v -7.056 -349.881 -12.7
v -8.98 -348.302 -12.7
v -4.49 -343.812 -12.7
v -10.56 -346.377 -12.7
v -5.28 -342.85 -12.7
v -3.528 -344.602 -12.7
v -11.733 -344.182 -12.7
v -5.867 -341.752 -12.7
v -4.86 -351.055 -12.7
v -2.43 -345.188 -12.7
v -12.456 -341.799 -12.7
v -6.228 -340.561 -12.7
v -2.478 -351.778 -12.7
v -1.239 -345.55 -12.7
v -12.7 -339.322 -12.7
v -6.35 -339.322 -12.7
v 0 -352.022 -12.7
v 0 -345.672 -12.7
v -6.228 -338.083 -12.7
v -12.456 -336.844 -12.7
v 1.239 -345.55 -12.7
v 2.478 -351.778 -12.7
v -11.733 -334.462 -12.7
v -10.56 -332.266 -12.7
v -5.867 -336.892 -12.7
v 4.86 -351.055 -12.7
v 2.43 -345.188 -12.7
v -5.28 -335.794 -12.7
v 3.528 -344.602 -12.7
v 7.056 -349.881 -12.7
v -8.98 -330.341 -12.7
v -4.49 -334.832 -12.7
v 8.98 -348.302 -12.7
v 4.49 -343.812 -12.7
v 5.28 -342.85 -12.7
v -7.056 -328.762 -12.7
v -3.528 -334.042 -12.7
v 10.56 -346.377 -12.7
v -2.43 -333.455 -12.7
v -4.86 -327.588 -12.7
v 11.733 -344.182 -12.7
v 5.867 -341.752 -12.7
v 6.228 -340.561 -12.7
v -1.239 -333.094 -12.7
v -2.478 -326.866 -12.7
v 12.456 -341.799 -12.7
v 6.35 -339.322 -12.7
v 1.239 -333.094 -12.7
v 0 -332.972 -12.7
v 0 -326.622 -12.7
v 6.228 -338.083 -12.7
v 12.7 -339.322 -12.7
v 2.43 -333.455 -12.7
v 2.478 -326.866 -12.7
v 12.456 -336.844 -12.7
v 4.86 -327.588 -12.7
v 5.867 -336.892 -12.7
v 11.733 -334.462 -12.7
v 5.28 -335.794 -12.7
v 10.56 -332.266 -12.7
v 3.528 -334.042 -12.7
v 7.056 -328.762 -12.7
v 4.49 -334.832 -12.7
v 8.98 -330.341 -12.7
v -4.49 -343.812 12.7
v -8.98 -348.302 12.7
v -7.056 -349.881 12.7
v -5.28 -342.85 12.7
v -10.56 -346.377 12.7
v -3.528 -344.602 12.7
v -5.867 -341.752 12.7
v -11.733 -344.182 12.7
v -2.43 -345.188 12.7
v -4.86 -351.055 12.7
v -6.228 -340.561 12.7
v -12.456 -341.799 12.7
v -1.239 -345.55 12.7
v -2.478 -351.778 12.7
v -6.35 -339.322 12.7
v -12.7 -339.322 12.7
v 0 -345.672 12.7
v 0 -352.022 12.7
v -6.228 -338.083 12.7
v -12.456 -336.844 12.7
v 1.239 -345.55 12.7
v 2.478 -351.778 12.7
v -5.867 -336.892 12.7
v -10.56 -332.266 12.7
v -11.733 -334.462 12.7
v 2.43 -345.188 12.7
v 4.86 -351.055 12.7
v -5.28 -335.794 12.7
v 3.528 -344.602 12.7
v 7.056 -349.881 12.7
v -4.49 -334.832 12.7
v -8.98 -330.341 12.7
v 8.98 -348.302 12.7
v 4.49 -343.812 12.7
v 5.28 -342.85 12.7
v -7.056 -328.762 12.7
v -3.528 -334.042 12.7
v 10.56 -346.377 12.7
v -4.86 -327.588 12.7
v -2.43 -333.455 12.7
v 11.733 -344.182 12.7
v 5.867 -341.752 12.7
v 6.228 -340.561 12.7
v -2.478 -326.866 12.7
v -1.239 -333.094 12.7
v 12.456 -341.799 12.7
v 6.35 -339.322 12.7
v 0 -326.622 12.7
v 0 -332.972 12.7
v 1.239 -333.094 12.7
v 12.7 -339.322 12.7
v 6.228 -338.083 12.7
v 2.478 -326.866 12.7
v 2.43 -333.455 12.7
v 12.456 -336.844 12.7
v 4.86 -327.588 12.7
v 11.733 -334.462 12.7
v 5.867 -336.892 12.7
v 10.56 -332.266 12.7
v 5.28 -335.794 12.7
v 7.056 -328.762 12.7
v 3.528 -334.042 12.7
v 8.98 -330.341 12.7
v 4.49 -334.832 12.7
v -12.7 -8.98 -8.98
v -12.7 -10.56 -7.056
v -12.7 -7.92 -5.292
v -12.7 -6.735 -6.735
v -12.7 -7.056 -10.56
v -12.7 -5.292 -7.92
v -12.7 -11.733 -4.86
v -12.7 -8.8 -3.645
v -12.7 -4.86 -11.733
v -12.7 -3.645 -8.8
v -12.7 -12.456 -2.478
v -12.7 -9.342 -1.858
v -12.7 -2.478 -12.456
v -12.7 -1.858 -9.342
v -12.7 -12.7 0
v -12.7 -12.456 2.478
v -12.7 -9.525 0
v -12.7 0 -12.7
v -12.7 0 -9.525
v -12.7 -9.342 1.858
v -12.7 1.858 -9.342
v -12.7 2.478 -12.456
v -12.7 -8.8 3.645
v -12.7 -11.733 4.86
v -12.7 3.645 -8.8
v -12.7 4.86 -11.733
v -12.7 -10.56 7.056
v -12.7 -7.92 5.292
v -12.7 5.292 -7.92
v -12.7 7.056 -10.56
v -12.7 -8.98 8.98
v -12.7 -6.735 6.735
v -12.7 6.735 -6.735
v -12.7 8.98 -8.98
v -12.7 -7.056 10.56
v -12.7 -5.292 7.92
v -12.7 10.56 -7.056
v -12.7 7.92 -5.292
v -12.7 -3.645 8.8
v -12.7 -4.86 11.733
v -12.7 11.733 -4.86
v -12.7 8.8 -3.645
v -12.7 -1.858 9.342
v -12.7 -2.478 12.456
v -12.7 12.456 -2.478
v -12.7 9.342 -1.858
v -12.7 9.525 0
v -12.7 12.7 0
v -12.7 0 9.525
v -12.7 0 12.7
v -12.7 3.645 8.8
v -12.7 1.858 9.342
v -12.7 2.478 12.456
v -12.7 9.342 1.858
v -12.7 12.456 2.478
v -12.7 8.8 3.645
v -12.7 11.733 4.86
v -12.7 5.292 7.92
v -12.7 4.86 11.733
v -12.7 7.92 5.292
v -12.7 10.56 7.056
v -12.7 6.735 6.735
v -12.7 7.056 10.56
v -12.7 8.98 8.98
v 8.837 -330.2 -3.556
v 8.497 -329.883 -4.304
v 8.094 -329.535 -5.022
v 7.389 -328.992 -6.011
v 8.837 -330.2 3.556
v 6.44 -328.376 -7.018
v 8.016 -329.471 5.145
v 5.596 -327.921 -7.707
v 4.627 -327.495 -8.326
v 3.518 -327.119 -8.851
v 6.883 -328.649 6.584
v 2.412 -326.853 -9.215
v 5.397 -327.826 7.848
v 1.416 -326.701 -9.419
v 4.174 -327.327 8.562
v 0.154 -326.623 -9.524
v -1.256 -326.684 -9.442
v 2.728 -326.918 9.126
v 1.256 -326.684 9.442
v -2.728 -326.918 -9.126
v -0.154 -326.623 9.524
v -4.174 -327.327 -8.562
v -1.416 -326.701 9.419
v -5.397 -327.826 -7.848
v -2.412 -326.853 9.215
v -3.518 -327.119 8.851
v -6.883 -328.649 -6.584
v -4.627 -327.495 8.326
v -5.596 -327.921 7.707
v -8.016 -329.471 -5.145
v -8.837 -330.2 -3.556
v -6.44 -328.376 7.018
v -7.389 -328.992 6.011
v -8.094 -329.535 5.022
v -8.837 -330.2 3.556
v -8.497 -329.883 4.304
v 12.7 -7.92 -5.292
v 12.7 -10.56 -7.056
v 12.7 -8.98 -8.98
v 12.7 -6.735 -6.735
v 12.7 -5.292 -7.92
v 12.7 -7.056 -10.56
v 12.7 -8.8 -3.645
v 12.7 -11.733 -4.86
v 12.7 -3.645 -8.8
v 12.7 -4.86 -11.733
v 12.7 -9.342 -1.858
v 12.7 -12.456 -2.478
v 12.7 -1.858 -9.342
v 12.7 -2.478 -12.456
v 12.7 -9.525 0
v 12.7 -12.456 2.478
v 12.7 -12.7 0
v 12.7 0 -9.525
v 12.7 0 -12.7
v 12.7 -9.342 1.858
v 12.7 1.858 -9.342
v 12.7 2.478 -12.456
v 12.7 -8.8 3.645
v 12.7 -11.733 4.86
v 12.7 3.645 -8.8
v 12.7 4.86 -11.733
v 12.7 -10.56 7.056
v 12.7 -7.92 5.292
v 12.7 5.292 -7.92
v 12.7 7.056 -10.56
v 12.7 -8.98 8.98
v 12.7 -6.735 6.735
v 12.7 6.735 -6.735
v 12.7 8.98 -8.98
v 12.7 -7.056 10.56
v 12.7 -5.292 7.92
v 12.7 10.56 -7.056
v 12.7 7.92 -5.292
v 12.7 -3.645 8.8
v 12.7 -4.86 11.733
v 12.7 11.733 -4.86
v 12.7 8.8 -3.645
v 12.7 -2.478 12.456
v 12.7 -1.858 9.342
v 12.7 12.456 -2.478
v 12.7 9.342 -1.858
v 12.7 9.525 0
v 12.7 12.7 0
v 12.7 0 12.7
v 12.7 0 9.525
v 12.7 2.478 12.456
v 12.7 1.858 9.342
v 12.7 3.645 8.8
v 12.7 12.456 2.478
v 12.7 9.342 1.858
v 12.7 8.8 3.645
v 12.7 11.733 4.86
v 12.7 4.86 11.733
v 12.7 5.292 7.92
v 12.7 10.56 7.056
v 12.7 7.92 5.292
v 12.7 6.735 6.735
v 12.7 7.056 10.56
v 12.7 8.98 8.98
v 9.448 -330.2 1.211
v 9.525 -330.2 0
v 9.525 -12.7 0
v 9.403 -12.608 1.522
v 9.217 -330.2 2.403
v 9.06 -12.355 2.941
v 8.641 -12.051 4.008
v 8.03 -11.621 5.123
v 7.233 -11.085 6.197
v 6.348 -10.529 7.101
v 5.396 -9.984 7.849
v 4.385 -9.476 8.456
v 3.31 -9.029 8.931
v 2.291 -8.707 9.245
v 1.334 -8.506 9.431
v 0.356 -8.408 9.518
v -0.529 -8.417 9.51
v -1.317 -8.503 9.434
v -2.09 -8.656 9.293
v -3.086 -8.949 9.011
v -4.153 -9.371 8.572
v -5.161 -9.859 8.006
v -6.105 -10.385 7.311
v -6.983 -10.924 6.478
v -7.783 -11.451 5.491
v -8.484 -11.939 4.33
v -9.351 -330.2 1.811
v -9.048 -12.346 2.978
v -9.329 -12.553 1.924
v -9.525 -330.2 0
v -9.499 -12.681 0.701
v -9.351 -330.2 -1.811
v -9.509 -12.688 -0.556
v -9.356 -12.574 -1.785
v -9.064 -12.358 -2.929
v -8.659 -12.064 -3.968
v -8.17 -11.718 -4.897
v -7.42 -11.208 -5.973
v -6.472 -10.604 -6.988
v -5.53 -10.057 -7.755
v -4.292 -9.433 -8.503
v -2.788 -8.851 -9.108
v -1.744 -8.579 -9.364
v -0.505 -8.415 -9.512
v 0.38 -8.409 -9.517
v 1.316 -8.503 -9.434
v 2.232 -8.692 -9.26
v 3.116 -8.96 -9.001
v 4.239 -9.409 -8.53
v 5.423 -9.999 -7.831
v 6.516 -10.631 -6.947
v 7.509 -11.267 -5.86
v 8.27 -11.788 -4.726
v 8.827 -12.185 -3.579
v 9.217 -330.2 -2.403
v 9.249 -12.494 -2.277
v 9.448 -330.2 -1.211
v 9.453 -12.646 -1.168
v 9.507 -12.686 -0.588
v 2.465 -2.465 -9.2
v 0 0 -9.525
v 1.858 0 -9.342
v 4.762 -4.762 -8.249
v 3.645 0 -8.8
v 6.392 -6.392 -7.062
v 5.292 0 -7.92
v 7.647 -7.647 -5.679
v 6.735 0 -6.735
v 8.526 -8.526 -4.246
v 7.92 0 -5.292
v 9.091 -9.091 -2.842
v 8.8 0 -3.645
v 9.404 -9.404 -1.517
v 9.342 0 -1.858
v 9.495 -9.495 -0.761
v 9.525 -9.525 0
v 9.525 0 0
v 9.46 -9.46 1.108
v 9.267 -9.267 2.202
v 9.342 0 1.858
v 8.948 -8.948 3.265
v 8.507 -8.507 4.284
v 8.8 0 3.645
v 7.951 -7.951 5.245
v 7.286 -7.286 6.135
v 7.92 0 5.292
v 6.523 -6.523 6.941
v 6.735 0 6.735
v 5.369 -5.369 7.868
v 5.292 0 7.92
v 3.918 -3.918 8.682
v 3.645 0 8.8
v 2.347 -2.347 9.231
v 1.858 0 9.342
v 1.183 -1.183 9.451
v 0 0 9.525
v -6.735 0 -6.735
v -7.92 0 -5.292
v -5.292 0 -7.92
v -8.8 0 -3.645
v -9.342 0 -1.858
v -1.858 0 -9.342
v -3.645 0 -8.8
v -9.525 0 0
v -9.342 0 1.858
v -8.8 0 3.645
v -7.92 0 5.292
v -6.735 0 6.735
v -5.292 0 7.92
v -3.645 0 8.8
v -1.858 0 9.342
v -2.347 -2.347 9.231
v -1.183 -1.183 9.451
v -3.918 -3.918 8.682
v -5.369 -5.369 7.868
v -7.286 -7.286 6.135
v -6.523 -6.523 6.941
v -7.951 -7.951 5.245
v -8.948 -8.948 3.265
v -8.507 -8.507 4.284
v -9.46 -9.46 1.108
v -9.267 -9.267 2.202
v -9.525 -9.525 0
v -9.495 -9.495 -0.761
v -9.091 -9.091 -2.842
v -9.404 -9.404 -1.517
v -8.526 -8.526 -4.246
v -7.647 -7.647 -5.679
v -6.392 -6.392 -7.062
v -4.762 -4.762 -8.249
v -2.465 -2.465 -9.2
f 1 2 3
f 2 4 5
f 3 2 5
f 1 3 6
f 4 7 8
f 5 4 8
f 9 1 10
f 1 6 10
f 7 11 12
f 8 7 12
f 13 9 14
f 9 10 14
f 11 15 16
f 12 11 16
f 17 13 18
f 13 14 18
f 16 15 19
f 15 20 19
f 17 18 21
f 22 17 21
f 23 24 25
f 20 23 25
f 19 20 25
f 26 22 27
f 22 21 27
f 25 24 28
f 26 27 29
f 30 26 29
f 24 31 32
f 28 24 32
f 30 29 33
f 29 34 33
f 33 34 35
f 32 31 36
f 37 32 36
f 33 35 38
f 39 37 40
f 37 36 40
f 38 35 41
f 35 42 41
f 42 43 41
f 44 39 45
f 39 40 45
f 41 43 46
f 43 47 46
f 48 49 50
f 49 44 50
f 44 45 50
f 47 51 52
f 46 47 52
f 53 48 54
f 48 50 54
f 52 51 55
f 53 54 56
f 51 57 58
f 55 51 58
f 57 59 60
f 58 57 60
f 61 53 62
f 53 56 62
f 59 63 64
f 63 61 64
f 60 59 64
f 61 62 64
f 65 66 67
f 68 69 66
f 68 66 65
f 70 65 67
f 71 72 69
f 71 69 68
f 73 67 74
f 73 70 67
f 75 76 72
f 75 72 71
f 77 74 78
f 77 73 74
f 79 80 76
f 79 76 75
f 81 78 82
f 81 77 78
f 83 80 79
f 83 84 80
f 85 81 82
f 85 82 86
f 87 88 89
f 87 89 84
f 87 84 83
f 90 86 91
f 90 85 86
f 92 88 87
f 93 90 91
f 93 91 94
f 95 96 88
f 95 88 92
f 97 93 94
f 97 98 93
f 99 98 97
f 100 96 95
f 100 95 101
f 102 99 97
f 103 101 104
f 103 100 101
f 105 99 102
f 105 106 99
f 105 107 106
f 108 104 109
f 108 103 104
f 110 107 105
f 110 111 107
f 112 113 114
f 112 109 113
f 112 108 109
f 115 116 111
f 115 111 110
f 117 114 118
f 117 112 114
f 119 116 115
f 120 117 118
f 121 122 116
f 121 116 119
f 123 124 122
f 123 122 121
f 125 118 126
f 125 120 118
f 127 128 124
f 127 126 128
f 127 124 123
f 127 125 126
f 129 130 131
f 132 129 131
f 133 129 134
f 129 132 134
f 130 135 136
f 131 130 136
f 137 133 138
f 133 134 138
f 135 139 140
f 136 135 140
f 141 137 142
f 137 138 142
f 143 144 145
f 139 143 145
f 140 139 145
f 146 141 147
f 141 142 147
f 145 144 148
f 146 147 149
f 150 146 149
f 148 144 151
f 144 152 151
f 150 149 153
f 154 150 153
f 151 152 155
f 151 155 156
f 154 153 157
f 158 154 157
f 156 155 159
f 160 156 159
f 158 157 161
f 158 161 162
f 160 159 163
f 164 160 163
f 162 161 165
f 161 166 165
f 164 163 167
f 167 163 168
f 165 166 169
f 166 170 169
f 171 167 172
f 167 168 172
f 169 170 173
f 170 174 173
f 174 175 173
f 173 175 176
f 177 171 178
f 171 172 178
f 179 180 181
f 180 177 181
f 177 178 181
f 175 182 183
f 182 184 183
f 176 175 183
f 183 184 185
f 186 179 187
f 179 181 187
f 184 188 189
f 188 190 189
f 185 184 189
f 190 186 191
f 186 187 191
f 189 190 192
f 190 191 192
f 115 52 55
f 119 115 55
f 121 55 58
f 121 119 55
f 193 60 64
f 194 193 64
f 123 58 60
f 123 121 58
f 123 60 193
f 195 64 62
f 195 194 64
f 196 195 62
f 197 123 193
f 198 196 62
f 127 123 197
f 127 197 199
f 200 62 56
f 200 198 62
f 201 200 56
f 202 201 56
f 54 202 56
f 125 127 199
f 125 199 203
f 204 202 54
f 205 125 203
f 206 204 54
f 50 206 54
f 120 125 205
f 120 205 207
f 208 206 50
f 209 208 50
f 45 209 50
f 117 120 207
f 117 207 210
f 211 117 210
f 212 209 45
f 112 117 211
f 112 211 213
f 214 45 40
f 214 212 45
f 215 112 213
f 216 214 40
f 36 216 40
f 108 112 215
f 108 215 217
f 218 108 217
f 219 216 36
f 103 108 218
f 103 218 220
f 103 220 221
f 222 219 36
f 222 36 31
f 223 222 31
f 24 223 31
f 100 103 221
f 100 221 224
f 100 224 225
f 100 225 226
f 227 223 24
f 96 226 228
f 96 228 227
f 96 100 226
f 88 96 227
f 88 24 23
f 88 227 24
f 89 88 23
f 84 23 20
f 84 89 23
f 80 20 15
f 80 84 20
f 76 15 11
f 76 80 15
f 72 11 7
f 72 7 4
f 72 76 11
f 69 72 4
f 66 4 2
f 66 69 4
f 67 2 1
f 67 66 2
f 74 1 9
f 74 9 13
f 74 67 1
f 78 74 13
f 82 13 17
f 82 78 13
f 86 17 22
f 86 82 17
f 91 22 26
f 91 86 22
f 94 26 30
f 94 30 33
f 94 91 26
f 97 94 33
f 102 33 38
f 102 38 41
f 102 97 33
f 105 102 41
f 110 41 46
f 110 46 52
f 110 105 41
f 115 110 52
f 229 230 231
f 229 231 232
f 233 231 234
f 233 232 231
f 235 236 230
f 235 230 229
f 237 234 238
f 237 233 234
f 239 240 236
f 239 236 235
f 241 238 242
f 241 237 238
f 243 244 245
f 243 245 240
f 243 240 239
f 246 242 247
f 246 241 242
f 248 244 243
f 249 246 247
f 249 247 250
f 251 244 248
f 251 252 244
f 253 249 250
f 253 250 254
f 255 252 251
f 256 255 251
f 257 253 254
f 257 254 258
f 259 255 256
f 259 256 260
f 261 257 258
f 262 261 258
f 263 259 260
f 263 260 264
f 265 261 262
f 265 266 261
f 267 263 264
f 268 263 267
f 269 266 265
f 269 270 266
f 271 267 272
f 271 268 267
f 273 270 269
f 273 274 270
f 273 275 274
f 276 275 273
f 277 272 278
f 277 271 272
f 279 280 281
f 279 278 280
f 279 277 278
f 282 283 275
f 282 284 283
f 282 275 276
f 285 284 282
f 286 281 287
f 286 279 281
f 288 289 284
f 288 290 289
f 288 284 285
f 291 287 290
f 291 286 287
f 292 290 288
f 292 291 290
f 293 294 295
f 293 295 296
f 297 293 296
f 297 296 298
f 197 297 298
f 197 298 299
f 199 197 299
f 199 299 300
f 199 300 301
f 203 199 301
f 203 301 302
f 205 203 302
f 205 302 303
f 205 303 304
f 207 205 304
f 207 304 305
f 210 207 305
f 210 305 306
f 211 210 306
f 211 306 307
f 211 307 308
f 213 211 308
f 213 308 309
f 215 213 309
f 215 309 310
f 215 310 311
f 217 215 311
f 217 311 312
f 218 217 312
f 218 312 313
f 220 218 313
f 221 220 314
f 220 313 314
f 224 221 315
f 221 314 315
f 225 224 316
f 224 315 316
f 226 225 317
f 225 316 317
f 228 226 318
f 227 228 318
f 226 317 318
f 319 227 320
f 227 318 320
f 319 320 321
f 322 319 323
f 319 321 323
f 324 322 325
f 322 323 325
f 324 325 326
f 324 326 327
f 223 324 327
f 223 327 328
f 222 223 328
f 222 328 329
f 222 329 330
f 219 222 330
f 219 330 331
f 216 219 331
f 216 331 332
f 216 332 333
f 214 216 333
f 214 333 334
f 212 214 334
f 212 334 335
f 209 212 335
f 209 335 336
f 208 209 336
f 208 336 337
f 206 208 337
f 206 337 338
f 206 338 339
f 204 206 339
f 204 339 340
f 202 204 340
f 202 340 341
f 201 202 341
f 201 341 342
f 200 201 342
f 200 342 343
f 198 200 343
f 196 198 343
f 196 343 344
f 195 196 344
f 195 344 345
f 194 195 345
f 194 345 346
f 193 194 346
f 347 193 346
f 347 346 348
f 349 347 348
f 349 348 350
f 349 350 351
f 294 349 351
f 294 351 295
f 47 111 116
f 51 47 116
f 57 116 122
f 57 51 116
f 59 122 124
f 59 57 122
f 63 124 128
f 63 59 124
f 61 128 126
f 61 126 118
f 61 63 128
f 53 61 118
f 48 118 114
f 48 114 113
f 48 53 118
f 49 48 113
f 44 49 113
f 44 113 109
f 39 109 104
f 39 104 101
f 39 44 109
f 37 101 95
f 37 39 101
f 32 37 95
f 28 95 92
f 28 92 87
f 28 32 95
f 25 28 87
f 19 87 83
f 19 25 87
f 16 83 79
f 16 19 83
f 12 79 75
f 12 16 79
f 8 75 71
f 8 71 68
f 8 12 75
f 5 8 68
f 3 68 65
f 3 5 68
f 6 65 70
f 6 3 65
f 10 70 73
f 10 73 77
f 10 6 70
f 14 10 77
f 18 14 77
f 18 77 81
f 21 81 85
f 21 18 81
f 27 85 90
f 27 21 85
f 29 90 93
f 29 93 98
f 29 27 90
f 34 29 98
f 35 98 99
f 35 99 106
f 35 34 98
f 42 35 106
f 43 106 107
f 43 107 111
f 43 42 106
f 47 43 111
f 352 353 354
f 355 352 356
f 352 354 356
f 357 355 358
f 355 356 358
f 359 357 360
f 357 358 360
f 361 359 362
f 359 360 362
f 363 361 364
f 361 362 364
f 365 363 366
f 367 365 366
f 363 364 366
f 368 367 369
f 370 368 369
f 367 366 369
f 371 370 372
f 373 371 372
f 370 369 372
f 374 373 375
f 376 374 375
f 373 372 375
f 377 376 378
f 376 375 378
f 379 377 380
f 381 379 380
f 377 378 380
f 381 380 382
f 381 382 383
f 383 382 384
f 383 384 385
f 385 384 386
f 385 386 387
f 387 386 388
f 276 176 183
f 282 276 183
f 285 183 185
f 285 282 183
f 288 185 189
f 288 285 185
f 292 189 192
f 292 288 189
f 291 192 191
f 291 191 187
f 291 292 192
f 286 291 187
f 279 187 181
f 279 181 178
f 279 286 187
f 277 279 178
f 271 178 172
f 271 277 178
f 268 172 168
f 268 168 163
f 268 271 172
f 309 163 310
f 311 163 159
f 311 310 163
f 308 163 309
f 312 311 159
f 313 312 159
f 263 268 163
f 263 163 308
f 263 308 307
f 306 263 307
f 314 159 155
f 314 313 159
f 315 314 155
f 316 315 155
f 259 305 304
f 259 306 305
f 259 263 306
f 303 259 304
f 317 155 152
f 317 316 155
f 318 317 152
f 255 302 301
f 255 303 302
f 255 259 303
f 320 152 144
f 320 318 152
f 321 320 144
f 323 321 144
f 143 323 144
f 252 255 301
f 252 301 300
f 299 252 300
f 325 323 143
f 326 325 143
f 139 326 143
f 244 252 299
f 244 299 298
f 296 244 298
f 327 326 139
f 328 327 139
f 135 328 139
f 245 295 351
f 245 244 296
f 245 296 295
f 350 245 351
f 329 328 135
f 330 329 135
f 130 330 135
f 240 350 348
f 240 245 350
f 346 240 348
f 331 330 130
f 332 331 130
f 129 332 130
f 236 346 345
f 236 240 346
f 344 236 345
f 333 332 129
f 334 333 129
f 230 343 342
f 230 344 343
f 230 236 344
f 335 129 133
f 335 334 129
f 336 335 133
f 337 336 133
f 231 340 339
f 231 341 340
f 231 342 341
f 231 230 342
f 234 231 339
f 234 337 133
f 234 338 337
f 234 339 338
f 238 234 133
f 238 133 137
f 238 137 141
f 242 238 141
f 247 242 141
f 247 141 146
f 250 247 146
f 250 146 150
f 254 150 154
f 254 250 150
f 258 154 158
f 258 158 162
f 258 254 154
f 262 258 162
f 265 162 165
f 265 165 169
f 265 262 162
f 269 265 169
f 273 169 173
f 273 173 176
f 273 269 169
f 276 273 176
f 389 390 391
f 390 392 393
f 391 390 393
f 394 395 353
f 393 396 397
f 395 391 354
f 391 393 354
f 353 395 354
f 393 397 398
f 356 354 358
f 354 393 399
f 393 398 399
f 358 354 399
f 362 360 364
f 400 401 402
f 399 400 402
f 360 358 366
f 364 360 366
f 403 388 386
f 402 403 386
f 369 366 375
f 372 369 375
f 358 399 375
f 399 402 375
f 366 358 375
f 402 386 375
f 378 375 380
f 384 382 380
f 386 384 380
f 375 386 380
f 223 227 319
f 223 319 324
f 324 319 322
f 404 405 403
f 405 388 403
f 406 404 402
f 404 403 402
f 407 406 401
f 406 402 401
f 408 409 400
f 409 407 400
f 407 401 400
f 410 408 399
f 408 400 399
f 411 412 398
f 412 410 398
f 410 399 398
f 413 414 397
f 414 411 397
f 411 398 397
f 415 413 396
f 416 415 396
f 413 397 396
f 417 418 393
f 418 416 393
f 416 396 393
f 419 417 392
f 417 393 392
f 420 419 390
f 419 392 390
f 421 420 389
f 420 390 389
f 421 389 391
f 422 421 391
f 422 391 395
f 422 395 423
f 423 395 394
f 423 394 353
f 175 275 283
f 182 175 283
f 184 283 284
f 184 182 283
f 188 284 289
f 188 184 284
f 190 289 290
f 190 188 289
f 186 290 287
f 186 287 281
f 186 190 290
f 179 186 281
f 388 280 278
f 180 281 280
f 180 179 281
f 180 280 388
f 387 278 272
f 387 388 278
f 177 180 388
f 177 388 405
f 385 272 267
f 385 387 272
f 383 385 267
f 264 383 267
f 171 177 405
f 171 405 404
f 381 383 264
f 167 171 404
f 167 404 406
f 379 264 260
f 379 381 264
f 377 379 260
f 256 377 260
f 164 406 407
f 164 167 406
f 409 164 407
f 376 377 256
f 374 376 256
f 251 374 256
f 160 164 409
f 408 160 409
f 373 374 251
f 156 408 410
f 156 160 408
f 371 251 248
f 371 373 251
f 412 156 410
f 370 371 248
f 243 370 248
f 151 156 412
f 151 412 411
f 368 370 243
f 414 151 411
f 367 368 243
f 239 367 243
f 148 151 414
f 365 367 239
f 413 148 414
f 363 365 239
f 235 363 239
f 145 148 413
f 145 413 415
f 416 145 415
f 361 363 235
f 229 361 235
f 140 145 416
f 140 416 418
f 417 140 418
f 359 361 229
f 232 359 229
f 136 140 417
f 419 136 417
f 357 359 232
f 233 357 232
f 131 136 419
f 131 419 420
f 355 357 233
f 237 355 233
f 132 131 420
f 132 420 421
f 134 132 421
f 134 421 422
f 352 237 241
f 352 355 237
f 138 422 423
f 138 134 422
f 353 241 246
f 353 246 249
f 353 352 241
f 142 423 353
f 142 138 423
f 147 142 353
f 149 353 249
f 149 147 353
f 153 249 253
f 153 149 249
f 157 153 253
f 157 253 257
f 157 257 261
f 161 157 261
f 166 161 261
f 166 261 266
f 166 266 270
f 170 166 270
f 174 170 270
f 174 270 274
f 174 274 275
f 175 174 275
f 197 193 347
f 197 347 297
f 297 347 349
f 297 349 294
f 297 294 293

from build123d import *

# Parameters (mm, degrees)
F1_R     = 12.7
F1_R_2   = 9.525
F2_DEPTH = 12.7
F0_R     = 9.525
F3_DEPTH = 330.2
F4_R     = 12.7
F4_R_2   = 6.35
F5_DEPTH = 12.7


with BuildPart() as f2:
    # F1 (on Right) → F2 (new body, symmetric)
    with BuildSketch(Plane.YZ):
        Circle(F1_R)
        Circle(F1_R_2, mode=Mode.SUBTRACT)
    extrude(amount=F2_DEPTH, both=True)

    # F0 (on Front) → F3 (join)
    with BuildSketch(Plane.XZ):
        Circle(F0_R)
    extrude(amount=F3_DEPTH)

    # F4 (on Top) → F5 (join, symmetric)
    with BuildSketch(Plane.XY):
        with Locations((0, -339.3217325211)):
            Circle(F4_R)
        with Locations((0, -339.3217325211)):
            Circle(F4_R_2, mode=Mode.SUBTRACT)
    extrude(amount=F5_DEPTH, both=True)


solid = f2.part
